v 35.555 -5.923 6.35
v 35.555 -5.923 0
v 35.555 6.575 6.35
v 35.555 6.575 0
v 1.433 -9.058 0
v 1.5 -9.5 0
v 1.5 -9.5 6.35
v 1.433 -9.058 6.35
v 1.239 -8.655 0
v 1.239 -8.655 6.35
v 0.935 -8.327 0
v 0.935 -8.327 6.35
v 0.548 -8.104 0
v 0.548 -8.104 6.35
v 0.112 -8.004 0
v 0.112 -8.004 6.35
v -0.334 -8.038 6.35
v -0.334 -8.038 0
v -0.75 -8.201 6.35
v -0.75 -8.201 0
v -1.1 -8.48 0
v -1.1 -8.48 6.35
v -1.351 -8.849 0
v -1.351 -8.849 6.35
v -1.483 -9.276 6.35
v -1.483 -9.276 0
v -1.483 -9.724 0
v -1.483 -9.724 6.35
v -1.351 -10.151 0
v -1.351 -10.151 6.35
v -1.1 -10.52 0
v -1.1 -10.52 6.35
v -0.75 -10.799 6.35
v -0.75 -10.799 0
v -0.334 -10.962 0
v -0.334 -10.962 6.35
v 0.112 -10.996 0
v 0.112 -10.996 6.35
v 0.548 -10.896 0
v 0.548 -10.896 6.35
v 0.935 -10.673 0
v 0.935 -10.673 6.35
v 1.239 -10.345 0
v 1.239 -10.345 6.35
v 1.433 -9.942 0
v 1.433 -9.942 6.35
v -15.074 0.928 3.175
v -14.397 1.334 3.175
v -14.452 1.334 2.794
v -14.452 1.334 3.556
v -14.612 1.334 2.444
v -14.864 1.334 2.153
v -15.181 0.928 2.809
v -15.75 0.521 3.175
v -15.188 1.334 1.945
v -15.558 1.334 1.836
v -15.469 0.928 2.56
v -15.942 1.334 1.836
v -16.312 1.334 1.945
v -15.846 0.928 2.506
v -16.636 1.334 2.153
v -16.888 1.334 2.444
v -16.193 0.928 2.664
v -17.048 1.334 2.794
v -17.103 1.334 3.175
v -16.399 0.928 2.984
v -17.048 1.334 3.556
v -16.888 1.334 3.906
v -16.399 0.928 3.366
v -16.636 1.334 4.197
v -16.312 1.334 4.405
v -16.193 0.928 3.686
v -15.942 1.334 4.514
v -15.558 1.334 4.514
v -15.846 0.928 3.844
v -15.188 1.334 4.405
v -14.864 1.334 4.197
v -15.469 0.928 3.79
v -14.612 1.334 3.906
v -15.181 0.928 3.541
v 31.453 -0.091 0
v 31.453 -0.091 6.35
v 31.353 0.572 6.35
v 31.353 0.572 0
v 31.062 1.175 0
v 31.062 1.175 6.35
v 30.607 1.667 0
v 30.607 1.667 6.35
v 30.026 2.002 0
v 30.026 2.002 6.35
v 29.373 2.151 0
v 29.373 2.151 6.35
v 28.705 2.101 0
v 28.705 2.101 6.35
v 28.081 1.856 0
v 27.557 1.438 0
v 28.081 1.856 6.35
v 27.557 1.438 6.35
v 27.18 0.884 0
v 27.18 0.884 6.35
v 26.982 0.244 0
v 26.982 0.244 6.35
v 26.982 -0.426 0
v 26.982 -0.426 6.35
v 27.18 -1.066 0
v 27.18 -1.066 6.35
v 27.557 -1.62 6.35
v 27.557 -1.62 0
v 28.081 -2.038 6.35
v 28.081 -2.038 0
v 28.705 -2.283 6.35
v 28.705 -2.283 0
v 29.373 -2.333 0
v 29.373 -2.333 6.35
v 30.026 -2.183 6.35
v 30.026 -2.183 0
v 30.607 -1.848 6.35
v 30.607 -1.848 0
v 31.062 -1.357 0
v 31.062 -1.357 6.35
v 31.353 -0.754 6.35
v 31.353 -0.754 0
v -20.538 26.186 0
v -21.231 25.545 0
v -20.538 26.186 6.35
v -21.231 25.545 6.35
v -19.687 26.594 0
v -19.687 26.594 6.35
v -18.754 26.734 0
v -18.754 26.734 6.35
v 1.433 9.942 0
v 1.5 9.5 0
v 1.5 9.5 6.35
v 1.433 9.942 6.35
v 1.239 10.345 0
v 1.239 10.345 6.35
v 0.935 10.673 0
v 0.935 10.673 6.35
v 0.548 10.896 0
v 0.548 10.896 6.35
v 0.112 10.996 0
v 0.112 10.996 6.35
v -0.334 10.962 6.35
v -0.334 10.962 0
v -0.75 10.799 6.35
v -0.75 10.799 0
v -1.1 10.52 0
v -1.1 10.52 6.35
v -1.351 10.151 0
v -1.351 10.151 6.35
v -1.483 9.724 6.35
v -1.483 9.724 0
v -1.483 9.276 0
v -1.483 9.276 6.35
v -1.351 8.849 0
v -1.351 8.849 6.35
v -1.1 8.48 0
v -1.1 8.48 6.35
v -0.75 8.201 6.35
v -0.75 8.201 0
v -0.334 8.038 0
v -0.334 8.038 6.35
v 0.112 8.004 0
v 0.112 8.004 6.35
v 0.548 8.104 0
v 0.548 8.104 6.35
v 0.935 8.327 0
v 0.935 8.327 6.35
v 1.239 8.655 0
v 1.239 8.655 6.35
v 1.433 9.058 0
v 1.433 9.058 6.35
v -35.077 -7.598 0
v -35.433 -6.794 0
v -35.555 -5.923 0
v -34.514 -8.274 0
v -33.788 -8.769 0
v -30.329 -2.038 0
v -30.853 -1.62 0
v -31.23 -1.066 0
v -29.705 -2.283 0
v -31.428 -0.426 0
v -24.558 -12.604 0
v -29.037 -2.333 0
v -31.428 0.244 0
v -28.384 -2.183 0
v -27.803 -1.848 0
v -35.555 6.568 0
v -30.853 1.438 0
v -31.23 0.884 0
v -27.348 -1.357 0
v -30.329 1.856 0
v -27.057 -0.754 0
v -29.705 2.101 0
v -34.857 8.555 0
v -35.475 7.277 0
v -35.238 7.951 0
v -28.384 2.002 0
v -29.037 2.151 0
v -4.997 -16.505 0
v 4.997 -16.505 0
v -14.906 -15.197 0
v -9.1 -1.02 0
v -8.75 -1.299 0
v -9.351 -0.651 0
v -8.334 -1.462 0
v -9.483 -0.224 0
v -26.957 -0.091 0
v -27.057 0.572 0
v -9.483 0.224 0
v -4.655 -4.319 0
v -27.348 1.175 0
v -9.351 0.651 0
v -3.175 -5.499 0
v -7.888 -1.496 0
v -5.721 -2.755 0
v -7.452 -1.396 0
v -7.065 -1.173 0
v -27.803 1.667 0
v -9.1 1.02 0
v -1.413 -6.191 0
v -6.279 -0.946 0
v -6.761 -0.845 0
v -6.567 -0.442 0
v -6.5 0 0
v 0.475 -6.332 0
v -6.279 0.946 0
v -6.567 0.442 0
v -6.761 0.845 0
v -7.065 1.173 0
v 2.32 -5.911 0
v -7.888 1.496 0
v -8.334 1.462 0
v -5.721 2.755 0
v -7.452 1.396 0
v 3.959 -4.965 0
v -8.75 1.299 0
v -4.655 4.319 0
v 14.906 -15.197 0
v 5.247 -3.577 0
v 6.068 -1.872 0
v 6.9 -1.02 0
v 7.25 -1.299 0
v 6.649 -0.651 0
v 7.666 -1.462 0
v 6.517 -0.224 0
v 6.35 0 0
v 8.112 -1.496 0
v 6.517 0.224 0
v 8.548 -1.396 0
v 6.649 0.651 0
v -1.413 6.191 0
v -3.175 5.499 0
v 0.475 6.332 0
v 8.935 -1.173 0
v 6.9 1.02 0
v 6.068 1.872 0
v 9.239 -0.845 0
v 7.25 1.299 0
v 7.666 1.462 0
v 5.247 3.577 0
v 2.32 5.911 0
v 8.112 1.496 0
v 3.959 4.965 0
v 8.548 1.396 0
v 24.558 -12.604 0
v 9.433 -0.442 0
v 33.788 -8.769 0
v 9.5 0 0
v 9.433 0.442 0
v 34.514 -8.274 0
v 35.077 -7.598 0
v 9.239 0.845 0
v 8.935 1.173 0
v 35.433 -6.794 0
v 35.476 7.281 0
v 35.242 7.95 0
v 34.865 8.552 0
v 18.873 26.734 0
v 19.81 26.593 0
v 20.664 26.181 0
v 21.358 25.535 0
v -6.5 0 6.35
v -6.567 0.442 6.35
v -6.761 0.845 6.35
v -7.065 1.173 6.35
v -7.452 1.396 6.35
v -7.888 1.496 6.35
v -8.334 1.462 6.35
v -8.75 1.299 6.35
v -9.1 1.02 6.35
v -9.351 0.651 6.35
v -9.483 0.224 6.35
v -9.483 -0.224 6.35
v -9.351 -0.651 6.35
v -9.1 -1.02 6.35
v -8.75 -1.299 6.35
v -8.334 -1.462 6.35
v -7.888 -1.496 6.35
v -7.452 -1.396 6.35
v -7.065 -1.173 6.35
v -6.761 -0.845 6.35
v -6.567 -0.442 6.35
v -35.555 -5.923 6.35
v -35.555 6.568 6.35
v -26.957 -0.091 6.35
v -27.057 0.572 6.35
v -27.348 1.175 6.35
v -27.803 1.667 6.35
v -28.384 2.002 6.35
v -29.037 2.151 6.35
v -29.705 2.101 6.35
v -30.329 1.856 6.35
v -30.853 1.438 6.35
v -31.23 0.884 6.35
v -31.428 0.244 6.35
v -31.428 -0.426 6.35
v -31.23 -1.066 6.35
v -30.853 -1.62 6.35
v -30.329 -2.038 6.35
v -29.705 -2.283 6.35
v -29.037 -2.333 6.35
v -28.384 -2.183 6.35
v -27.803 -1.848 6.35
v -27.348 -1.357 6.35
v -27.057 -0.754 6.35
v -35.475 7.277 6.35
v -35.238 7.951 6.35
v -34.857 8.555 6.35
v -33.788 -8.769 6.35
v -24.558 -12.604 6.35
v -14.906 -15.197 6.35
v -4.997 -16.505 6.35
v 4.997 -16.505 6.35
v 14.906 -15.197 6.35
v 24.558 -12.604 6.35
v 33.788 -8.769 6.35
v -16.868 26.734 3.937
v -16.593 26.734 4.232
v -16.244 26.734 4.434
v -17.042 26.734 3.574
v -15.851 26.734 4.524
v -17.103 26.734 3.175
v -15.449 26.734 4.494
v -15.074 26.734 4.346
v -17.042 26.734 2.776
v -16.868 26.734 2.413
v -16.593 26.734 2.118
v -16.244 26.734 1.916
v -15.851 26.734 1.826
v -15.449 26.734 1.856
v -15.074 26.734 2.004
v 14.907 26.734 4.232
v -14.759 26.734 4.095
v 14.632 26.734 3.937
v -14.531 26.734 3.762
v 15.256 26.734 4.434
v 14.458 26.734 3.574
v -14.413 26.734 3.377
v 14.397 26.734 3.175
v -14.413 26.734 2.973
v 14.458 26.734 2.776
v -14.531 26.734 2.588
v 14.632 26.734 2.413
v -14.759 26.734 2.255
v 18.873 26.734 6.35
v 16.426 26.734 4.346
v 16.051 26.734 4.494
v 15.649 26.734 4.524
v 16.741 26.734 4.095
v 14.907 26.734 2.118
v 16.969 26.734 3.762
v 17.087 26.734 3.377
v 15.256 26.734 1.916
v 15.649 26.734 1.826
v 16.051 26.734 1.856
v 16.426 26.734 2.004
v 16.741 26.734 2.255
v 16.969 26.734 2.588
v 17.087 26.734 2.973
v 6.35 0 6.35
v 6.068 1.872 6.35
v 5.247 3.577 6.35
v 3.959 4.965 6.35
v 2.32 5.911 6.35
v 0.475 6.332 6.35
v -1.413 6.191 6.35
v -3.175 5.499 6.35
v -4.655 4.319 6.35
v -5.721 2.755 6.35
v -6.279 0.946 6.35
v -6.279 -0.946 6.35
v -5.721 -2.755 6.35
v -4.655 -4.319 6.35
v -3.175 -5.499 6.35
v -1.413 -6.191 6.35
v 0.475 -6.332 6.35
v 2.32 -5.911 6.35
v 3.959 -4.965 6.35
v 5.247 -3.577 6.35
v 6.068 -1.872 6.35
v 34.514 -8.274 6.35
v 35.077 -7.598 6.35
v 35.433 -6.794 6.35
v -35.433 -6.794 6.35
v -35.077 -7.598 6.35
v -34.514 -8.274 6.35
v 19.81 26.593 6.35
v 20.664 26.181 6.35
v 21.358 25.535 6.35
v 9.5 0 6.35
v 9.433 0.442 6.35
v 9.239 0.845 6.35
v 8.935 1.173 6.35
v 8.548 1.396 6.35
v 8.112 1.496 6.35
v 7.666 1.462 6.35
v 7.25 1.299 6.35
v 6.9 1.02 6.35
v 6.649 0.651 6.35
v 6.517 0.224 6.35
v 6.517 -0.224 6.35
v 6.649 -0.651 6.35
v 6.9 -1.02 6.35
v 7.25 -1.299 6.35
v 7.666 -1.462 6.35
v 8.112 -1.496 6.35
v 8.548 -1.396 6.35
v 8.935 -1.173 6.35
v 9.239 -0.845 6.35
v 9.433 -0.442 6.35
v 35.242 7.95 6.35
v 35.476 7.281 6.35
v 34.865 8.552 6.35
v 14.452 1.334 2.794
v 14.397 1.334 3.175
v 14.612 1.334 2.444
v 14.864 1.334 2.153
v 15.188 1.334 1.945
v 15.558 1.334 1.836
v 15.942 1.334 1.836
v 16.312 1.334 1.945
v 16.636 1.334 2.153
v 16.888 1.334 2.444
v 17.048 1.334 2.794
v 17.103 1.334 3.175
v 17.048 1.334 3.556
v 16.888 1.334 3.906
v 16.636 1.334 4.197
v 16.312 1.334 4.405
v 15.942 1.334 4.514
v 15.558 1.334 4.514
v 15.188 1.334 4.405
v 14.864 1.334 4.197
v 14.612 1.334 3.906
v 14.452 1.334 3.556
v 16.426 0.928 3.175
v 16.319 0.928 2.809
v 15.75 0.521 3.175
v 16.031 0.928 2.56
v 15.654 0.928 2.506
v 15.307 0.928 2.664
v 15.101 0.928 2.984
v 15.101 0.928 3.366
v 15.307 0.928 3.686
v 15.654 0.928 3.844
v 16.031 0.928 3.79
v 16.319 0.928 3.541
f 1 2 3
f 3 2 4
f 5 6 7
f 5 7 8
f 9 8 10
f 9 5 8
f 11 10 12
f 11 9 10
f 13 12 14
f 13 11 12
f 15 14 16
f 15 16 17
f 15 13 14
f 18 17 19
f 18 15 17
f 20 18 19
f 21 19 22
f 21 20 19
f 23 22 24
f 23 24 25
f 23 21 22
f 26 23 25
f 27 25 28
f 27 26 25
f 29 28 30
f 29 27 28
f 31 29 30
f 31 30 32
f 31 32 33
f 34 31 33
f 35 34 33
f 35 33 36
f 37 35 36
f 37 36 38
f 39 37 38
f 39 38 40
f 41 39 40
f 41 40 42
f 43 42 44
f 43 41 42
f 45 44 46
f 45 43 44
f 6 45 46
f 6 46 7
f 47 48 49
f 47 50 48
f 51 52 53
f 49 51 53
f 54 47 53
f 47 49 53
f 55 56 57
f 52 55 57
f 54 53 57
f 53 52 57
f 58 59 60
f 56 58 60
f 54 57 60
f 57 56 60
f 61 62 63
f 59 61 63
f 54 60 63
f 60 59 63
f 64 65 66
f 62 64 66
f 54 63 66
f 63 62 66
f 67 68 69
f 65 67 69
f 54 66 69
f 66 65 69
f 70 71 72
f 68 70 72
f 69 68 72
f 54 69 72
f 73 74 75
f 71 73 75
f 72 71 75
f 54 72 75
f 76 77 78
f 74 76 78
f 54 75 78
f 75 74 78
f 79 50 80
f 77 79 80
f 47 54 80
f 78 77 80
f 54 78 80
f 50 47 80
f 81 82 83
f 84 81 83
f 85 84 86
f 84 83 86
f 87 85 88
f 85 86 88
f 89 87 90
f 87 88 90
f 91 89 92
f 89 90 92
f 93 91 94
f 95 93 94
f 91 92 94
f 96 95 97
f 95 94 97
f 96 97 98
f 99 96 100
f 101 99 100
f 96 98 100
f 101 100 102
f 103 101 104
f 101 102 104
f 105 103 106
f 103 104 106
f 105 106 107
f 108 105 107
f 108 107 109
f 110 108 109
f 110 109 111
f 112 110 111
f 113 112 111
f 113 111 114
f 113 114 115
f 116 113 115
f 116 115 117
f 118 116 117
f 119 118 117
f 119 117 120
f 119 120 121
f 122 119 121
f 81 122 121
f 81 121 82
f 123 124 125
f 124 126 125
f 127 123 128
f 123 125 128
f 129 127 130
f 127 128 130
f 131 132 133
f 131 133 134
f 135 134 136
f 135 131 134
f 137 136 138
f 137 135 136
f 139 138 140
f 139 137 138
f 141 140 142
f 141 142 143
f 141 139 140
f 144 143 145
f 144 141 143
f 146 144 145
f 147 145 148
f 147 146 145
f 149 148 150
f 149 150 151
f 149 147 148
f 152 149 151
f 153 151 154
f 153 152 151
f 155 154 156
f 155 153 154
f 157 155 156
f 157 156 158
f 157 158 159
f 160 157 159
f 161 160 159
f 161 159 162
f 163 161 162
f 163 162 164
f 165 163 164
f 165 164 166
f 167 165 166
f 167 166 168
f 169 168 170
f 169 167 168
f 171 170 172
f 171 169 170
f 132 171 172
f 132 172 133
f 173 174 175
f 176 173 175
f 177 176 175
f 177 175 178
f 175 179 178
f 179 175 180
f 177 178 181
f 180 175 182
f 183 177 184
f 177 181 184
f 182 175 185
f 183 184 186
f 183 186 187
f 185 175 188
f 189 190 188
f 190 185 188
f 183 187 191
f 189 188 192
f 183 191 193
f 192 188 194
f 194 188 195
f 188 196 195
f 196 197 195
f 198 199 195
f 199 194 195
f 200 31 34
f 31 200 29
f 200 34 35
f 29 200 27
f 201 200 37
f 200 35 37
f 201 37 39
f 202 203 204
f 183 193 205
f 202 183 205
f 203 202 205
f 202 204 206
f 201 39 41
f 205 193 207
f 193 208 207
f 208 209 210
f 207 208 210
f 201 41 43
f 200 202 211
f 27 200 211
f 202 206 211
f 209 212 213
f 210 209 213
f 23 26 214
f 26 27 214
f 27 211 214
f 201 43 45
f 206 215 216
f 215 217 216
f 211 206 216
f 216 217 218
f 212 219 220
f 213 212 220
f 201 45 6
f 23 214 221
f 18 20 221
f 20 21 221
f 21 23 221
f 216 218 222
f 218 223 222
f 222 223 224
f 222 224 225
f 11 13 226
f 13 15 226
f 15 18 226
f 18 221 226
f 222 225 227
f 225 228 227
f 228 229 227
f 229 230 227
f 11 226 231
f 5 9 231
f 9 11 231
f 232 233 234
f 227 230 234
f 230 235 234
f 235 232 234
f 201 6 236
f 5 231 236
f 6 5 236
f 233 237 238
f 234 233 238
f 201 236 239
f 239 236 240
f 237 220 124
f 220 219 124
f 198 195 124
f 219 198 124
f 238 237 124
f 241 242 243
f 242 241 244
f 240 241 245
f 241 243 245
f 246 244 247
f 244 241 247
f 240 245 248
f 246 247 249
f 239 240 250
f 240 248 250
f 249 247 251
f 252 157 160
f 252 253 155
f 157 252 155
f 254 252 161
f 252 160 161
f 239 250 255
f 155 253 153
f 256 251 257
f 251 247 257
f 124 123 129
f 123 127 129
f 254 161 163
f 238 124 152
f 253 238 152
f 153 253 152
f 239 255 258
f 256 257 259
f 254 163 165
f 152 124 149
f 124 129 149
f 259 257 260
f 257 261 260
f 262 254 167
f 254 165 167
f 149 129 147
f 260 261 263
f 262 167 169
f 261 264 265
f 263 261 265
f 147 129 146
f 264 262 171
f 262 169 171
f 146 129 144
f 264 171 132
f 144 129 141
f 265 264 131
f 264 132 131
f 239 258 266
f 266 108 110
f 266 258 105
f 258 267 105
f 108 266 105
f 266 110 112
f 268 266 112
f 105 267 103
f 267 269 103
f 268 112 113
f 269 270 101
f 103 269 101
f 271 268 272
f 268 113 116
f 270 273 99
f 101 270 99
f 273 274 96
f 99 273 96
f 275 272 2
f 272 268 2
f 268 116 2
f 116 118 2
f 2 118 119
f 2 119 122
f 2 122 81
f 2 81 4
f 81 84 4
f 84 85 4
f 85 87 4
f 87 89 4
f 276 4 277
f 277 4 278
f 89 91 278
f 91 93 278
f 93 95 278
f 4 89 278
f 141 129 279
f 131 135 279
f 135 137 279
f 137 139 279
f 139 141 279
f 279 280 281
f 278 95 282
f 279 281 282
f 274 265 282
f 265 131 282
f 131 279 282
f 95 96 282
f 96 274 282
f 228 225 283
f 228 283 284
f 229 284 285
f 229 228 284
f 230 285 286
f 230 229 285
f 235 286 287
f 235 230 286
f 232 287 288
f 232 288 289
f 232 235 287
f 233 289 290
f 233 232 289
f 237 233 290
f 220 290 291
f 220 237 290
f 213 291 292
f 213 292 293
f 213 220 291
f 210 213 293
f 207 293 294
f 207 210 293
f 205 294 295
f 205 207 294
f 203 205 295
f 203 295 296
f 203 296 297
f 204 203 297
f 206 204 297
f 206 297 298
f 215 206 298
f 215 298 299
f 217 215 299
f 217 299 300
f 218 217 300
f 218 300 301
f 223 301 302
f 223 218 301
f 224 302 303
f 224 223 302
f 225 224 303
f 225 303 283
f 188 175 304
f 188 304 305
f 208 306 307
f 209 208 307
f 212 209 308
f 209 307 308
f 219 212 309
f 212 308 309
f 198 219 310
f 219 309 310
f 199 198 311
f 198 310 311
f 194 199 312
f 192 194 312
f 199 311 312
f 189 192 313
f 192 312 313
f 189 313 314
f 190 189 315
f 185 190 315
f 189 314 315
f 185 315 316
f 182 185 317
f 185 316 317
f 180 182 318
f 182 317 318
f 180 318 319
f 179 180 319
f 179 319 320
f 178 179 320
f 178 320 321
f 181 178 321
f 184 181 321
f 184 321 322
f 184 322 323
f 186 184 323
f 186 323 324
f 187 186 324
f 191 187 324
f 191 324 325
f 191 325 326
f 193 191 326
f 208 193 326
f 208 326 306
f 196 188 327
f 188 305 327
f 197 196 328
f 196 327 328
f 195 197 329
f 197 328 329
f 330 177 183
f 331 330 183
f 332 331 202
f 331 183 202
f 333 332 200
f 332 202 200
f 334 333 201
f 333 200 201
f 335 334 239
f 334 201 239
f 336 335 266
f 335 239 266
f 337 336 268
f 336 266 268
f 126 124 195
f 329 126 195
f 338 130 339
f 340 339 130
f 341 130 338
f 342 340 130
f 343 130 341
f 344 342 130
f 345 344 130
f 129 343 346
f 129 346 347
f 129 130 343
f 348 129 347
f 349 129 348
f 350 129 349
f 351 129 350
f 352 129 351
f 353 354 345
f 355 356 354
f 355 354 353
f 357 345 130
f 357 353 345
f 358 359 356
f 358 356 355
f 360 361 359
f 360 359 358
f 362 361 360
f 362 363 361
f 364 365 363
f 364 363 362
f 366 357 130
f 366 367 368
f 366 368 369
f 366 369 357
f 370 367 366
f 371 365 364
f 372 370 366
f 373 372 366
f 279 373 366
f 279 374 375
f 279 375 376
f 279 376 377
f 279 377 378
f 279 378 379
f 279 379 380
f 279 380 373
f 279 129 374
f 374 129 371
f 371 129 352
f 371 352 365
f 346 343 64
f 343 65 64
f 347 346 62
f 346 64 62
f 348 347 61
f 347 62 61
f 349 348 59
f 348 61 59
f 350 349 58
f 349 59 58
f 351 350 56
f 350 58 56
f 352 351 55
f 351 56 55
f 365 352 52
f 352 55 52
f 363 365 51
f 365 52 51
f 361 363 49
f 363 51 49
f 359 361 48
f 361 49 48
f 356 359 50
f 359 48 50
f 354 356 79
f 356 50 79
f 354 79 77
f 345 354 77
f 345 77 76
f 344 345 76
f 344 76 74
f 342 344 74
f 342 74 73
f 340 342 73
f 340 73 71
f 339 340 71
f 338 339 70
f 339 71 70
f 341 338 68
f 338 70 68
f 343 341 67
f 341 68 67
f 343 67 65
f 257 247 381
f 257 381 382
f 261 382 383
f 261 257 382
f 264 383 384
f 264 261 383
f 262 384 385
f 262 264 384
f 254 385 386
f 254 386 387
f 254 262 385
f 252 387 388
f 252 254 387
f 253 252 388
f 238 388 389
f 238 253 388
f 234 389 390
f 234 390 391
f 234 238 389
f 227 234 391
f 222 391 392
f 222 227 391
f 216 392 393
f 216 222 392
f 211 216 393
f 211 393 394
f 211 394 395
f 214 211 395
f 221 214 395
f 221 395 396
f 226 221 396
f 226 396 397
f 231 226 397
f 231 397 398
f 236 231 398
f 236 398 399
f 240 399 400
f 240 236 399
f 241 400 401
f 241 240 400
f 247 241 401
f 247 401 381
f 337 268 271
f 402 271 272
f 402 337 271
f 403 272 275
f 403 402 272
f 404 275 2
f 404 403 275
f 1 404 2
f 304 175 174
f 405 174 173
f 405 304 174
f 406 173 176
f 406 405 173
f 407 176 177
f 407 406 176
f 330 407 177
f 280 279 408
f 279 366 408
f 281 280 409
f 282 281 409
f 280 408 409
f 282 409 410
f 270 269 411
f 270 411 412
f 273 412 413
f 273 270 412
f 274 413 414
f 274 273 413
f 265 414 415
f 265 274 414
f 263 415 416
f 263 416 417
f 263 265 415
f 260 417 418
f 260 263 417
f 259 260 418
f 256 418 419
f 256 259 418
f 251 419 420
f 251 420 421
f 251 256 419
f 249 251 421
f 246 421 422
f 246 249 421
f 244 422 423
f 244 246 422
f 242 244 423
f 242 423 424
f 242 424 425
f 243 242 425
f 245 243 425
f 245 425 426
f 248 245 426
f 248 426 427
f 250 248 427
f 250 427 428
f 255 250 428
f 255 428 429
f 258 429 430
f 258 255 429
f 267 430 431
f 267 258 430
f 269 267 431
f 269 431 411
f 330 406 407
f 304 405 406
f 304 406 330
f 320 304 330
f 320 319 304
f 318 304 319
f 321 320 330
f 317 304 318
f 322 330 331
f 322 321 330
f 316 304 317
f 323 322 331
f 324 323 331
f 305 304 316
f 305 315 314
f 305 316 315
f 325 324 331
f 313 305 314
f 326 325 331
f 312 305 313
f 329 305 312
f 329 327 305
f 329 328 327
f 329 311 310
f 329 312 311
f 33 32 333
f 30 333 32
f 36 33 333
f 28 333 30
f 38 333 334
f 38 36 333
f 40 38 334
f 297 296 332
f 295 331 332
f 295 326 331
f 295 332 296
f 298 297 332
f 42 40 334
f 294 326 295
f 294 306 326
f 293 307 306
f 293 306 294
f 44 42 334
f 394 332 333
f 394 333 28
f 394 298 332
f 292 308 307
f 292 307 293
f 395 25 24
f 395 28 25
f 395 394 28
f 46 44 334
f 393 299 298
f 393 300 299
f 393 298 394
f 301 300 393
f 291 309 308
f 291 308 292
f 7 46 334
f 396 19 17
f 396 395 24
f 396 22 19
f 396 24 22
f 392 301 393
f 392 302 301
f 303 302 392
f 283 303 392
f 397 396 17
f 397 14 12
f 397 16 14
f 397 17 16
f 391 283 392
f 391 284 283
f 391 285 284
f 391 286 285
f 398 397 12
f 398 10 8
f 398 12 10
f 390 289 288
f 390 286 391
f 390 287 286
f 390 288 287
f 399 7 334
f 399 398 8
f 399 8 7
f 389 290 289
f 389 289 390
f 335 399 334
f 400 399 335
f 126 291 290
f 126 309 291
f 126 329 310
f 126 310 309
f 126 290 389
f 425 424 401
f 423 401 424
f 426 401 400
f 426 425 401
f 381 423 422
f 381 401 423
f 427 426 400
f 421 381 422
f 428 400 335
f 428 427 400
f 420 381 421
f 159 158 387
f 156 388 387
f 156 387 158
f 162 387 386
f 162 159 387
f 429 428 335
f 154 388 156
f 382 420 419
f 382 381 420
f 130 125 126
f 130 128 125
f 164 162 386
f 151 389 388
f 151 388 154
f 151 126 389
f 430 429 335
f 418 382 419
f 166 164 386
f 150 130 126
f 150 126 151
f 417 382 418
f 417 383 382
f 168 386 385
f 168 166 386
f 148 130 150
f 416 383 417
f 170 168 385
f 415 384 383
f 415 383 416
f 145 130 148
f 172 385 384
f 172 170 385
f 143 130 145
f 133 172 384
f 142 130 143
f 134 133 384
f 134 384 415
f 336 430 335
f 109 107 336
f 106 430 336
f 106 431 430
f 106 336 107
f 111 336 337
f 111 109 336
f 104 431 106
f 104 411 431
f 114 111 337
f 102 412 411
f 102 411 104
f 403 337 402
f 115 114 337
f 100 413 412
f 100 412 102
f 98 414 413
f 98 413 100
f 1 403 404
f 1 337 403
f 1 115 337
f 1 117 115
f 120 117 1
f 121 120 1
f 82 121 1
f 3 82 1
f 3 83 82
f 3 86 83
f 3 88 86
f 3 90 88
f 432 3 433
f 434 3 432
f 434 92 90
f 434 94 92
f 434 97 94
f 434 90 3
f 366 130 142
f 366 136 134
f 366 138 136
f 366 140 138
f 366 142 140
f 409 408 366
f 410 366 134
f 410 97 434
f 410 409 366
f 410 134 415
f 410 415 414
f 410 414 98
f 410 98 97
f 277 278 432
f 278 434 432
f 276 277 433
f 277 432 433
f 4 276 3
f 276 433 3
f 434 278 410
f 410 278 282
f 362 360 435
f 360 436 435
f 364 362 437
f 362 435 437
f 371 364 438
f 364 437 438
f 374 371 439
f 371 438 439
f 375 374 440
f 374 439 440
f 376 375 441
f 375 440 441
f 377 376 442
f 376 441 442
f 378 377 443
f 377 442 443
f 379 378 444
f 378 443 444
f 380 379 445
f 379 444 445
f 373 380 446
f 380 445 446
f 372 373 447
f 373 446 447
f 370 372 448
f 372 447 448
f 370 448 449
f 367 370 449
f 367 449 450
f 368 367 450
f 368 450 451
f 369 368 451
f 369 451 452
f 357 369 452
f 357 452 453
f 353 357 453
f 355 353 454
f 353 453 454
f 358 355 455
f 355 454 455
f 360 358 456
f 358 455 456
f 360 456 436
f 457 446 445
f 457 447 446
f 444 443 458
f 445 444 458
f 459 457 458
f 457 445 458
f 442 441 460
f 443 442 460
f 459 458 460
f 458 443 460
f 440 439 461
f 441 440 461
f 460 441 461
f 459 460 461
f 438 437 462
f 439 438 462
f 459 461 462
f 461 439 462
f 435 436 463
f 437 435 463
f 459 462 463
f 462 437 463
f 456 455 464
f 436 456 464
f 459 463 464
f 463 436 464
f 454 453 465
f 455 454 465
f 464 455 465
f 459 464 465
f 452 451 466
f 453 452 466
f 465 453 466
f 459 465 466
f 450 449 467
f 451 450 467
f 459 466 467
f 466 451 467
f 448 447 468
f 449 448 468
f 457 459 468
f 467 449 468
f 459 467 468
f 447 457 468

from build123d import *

# Parameters (mm, degrees)
SKETCH1_W                 = 71.11
SKETCH1_H                 = 53.65
SKETCH1_R                 = 6.35
SKETCH1_R_2               = 1.5
BOSS_EXTRUDE1_DEPTH       = 6.35
F_8_CLEARANCE_HOLE1_D     = 4.4958
F_6_32_TAPPED_HOLE1_D     = 2.7051
F_6_32_TAPPED_HOLE1_DEPTH = 25.4
F_6_32_TAPPED_HOLE1_TIP   = 0.81269403
CUT_EXTRUDE1_DEPTH        = 7.35
FILLET1_R                 = 3.175


with BuildPart() as part:
    # Sketch1 → Boss-Extrude1 (new body)
    with BuildSketch(Plane.XY):
        with Locations((0, -0.090978152)):
            Rectangle(SKETCH1_W, SKETCH1_H)
        Circle(SKETCH1_R, mode=Mode.SUBTRACT)
        with Locations((-8, 0)):
            Circle(SKETCH1_R_2, mode=Mode.SUBTRACT)
        with Locations((0, 9.5)):
            Circle(SKETCH1_R_2, mode=Mode.SUBTRACT)
        with Locations((8, 0)):
            Circle(SKETCH1_R_2, mode=Mode.SUBTRACT)
        with Locations((0, -9.5)):
            Circle(SKETCH1_R_2, mode=Mode.SUBTRACT)
    extrude(amount=BOSS_EXTRUDE1_DEPTH)

    # #8 Clearance Hole1 (through all)
    with Locations(Plane(origin=(0, 0, 0), x_dir=(-1, 0, 0), z_dir=(0, 0, -1))):
        with Locations((-29.205, -0.090978152), (29.205, -0.090978152)):
            Hole(F_8_CLEARANCE_HOLE1_D / 2)

    # #6-32 Tapped Hole1
    with Locations(Plane(origin=(0, 26.734021848, 0), x_dir=(1, 0, 0), z_dir=(0, 1, 0))):
        with Locations((15.75, -3.175), (-15.75, -3.175)):
            Hole(F_6_32_TAPPED_HOLE1_D / 2, depth=F_6_32_TAPPED_HOLE1_DEPTH)
            with Locations((0, 0, -(F_6_32_TAPPED_HOLE1_DEPTH + F_6_32_TAPPED_HOLE1_TIP / 2))):  # 118° drill point
                Cone(0, F_6_32_TAPPED_HOLE1_D / 2, F_6_32_TAPPED_HOLE1_TIP, mode=Mode.SUBTRACT)

    # Sketch7 → Cut-Extrude1 (cut, through all)
    with BuildSketch(Plane(origin=(0, 0, 0), x_dir=(-1, 0, 0), z_dir=(0, 0, -1))):
        Polygon((-35.555, 26.734021848), (-35.555, 7.684021848), (-20.40455, 26.734021848), align=None)
        Polygon((35.555, 26.734021848), (20.27755, 26.734021848), (35.555, 7.684021848), align=None)
        with BuildLine():
            Line((-35.555, -26.915978152), (35.555, -26.915978152))
            Line((35.555, -26.915978152), (35.555, -7.865978152))
            ThreePointArc((35.555, -7.865978152), (0, -16.669524425), (-35.555, -7.865978152))
            Line((-35.555, -7.865978152), (-35.555, -26.915978152))
        make_face()
    extrude(amount=-CUT_EXTRUDE1_DEPTH, mode=Mode.SUBTRACT)

    # Fillet1
    fillet1_edges = [part.edges().sort_by_distance(p)[0] for p in [
        (35.555, 7.684021848, 3.175),
        (20.40455, 26.734021848, 3.175),
        (-20.27755, 26.734021848, 3.175),
        (-35.555, 7.684021848, 3.175),
        (35.555, -7.865978152, 3.175),
        (-35.555, -7.865978152, 3.175),
    ]]
    fillet(fillet1_edges, radius=FILLET1_R)


solid = part.part
